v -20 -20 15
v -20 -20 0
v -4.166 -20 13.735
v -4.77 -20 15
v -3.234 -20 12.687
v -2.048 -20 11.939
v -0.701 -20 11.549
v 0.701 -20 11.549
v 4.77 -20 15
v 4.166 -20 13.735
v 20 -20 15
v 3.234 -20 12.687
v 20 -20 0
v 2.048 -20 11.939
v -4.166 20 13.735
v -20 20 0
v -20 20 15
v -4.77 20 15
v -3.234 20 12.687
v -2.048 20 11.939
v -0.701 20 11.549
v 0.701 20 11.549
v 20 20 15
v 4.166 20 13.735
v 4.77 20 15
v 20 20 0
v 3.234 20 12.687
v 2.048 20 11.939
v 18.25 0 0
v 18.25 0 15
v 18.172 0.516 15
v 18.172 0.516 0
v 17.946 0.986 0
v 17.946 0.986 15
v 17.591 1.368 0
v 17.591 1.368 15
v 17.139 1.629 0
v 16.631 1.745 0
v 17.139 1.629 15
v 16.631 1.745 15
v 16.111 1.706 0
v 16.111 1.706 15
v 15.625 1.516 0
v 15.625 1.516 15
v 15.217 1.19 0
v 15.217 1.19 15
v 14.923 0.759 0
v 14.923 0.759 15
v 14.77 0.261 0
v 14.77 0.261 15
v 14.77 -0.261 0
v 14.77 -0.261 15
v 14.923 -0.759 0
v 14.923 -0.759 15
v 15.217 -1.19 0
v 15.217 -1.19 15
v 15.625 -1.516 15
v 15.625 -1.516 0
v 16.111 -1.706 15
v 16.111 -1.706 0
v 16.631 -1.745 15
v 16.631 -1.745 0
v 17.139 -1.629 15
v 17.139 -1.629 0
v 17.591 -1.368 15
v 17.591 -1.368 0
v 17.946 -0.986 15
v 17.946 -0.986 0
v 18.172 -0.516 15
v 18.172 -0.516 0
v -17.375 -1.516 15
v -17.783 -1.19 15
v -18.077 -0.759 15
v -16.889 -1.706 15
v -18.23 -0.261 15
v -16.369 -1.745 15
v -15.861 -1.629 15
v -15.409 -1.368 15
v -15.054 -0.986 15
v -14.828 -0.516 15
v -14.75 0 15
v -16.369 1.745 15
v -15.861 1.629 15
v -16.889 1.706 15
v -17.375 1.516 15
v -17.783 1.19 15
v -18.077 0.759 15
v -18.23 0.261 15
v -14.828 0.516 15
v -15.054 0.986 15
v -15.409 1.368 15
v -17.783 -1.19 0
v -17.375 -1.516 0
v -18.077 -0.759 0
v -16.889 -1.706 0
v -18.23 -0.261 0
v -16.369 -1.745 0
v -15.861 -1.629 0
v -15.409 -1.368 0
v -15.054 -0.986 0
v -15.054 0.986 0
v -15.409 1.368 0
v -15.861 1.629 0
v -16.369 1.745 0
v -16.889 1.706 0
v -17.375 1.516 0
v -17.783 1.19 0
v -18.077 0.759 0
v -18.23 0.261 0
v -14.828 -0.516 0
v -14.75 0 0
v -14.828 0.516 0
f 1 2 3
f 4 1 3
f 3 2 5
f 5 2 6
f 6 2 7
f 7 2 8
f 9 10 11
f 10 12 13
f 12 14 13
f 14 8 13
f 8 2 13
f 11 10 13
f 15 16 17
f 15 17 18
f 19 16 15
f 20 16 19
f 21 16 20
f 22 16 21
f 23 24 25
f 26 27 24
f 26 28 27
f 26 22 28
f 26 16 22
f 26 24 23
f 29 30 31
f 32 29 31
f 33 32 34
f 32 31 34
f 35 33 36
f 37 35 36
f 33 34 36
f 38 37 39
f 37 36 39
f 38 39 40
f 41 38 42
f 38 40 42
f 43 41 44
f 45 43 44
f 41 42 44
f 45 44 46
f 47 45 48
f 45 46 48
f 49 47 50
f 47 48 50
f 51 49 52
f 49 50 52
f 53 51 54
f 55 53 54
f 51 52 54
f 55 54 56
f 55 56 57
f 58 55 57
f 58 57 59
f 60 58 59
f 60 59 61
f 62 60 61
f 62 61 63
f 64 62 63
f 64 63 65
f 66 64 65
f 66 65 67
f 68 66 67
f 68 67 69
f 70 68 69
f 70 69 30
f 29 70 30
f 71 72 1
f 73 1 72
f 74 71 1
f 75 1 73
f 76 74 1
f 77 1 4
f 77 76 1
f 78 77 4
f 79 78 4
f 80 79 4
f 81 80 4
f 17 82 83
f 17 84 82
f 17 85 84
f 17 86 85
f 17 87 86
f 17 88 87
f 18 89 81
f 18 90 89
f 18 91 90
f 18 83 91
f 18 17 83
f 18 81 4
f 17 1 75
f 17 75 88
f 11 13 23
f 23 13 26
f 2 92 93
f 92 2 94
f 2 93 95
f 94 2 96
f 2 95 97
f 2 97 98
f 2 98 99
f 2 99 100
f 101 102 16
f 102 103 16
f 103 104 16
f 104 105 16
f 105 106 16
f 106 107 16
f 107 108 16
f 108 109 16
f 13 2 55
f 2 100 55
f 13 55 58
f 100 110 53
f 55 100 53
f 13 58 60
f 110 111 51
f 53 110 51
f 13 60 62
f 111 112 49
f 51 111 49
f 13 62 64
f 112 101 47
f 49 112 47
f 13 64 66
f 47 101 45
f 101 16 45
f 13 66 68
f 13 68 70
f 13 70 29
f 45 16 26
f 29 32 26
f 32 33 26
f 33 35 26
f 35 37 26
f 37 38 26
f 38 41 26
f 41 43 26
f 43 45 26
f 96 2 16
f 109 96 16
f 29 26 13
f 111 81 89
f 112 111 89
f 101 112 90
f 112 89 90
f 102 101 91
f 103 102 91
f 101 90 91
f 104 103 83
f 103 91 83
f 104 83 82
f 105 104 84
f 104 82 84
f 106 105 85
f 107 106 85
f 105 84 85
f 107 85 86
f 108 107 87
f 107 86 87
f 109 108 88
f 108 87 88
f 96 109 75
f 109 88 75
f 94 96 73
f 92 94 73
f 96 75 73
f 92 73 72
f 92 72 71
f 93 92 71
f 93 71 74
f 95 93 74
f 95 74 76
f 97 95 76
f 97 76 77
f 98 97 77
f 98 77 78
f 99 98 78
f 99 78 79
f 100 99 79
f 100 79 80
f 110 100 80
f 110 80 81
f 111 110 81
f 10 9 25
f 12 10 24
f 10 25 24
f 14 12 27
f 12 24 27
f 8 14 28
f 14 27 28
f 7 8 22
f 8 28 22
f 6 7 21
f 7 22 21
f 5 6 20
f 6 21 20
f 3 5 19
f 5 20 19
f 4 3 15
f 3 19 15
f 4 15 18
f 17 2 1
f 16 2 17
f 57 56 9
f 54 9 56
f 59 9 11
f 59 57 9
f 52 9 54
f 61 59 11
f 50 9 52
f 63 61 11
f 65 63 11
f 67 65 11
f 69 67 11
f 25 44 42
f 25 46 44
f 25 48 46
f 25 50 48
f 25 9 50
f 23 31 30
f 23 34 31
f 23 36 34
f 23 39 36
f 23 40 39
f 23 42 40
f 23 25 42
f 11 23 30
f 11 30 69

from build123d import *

# Parameters (mm, degrees)
SKETCH1_W           = 40
SKETCH1_H           = 40
BOSS_EXTRUDE1_DEPTH = 15
SKETCH2_R           = 1.75
CUT_EXTRUDE1_DEPTH  = 16
SKETCH3_R           = 5
CUT_EXTRUDE2_DEPTH  = 41


with BuildPart() as part:
    # Sketch1 → Boss-Extrude1 (new body)
    with BuildSketch(Plane.XY):
        Rectangle(SKETCH1_W, SKETCH1_H)
    extrude(amount=BOSS_EXTRUDE1_DEPTH)

    # Sketch2 → Cut-Extrude1 (cut, through all)
    with BuildSketch(Plane.XY.offset(15)):
        with Locations((-16.5, 0)):
            Circle(SKETCH2_R)
        with Locations((16.5, 0)):
            Circle(SKETCH2_R)
    extrude(amount=-CUT_EXTRUDE1_DEPTH, mode=Mode.SUBTRACT)

    # Sketch3 → Cut-Extrude2 (cut, through all)
    with BuildSketch(Plane(origin=(0, 20, 0), x_dir=(1, 0, 0), z_dir=(0, 1, 0))):
        with Locations((0, -16.5)):
            Circle(SKETCH3_R)
    extrude(amount=-CUT_EXTRUDE2_DEPTH, mode=Mode.SUBTRACT)


solid = part.part
